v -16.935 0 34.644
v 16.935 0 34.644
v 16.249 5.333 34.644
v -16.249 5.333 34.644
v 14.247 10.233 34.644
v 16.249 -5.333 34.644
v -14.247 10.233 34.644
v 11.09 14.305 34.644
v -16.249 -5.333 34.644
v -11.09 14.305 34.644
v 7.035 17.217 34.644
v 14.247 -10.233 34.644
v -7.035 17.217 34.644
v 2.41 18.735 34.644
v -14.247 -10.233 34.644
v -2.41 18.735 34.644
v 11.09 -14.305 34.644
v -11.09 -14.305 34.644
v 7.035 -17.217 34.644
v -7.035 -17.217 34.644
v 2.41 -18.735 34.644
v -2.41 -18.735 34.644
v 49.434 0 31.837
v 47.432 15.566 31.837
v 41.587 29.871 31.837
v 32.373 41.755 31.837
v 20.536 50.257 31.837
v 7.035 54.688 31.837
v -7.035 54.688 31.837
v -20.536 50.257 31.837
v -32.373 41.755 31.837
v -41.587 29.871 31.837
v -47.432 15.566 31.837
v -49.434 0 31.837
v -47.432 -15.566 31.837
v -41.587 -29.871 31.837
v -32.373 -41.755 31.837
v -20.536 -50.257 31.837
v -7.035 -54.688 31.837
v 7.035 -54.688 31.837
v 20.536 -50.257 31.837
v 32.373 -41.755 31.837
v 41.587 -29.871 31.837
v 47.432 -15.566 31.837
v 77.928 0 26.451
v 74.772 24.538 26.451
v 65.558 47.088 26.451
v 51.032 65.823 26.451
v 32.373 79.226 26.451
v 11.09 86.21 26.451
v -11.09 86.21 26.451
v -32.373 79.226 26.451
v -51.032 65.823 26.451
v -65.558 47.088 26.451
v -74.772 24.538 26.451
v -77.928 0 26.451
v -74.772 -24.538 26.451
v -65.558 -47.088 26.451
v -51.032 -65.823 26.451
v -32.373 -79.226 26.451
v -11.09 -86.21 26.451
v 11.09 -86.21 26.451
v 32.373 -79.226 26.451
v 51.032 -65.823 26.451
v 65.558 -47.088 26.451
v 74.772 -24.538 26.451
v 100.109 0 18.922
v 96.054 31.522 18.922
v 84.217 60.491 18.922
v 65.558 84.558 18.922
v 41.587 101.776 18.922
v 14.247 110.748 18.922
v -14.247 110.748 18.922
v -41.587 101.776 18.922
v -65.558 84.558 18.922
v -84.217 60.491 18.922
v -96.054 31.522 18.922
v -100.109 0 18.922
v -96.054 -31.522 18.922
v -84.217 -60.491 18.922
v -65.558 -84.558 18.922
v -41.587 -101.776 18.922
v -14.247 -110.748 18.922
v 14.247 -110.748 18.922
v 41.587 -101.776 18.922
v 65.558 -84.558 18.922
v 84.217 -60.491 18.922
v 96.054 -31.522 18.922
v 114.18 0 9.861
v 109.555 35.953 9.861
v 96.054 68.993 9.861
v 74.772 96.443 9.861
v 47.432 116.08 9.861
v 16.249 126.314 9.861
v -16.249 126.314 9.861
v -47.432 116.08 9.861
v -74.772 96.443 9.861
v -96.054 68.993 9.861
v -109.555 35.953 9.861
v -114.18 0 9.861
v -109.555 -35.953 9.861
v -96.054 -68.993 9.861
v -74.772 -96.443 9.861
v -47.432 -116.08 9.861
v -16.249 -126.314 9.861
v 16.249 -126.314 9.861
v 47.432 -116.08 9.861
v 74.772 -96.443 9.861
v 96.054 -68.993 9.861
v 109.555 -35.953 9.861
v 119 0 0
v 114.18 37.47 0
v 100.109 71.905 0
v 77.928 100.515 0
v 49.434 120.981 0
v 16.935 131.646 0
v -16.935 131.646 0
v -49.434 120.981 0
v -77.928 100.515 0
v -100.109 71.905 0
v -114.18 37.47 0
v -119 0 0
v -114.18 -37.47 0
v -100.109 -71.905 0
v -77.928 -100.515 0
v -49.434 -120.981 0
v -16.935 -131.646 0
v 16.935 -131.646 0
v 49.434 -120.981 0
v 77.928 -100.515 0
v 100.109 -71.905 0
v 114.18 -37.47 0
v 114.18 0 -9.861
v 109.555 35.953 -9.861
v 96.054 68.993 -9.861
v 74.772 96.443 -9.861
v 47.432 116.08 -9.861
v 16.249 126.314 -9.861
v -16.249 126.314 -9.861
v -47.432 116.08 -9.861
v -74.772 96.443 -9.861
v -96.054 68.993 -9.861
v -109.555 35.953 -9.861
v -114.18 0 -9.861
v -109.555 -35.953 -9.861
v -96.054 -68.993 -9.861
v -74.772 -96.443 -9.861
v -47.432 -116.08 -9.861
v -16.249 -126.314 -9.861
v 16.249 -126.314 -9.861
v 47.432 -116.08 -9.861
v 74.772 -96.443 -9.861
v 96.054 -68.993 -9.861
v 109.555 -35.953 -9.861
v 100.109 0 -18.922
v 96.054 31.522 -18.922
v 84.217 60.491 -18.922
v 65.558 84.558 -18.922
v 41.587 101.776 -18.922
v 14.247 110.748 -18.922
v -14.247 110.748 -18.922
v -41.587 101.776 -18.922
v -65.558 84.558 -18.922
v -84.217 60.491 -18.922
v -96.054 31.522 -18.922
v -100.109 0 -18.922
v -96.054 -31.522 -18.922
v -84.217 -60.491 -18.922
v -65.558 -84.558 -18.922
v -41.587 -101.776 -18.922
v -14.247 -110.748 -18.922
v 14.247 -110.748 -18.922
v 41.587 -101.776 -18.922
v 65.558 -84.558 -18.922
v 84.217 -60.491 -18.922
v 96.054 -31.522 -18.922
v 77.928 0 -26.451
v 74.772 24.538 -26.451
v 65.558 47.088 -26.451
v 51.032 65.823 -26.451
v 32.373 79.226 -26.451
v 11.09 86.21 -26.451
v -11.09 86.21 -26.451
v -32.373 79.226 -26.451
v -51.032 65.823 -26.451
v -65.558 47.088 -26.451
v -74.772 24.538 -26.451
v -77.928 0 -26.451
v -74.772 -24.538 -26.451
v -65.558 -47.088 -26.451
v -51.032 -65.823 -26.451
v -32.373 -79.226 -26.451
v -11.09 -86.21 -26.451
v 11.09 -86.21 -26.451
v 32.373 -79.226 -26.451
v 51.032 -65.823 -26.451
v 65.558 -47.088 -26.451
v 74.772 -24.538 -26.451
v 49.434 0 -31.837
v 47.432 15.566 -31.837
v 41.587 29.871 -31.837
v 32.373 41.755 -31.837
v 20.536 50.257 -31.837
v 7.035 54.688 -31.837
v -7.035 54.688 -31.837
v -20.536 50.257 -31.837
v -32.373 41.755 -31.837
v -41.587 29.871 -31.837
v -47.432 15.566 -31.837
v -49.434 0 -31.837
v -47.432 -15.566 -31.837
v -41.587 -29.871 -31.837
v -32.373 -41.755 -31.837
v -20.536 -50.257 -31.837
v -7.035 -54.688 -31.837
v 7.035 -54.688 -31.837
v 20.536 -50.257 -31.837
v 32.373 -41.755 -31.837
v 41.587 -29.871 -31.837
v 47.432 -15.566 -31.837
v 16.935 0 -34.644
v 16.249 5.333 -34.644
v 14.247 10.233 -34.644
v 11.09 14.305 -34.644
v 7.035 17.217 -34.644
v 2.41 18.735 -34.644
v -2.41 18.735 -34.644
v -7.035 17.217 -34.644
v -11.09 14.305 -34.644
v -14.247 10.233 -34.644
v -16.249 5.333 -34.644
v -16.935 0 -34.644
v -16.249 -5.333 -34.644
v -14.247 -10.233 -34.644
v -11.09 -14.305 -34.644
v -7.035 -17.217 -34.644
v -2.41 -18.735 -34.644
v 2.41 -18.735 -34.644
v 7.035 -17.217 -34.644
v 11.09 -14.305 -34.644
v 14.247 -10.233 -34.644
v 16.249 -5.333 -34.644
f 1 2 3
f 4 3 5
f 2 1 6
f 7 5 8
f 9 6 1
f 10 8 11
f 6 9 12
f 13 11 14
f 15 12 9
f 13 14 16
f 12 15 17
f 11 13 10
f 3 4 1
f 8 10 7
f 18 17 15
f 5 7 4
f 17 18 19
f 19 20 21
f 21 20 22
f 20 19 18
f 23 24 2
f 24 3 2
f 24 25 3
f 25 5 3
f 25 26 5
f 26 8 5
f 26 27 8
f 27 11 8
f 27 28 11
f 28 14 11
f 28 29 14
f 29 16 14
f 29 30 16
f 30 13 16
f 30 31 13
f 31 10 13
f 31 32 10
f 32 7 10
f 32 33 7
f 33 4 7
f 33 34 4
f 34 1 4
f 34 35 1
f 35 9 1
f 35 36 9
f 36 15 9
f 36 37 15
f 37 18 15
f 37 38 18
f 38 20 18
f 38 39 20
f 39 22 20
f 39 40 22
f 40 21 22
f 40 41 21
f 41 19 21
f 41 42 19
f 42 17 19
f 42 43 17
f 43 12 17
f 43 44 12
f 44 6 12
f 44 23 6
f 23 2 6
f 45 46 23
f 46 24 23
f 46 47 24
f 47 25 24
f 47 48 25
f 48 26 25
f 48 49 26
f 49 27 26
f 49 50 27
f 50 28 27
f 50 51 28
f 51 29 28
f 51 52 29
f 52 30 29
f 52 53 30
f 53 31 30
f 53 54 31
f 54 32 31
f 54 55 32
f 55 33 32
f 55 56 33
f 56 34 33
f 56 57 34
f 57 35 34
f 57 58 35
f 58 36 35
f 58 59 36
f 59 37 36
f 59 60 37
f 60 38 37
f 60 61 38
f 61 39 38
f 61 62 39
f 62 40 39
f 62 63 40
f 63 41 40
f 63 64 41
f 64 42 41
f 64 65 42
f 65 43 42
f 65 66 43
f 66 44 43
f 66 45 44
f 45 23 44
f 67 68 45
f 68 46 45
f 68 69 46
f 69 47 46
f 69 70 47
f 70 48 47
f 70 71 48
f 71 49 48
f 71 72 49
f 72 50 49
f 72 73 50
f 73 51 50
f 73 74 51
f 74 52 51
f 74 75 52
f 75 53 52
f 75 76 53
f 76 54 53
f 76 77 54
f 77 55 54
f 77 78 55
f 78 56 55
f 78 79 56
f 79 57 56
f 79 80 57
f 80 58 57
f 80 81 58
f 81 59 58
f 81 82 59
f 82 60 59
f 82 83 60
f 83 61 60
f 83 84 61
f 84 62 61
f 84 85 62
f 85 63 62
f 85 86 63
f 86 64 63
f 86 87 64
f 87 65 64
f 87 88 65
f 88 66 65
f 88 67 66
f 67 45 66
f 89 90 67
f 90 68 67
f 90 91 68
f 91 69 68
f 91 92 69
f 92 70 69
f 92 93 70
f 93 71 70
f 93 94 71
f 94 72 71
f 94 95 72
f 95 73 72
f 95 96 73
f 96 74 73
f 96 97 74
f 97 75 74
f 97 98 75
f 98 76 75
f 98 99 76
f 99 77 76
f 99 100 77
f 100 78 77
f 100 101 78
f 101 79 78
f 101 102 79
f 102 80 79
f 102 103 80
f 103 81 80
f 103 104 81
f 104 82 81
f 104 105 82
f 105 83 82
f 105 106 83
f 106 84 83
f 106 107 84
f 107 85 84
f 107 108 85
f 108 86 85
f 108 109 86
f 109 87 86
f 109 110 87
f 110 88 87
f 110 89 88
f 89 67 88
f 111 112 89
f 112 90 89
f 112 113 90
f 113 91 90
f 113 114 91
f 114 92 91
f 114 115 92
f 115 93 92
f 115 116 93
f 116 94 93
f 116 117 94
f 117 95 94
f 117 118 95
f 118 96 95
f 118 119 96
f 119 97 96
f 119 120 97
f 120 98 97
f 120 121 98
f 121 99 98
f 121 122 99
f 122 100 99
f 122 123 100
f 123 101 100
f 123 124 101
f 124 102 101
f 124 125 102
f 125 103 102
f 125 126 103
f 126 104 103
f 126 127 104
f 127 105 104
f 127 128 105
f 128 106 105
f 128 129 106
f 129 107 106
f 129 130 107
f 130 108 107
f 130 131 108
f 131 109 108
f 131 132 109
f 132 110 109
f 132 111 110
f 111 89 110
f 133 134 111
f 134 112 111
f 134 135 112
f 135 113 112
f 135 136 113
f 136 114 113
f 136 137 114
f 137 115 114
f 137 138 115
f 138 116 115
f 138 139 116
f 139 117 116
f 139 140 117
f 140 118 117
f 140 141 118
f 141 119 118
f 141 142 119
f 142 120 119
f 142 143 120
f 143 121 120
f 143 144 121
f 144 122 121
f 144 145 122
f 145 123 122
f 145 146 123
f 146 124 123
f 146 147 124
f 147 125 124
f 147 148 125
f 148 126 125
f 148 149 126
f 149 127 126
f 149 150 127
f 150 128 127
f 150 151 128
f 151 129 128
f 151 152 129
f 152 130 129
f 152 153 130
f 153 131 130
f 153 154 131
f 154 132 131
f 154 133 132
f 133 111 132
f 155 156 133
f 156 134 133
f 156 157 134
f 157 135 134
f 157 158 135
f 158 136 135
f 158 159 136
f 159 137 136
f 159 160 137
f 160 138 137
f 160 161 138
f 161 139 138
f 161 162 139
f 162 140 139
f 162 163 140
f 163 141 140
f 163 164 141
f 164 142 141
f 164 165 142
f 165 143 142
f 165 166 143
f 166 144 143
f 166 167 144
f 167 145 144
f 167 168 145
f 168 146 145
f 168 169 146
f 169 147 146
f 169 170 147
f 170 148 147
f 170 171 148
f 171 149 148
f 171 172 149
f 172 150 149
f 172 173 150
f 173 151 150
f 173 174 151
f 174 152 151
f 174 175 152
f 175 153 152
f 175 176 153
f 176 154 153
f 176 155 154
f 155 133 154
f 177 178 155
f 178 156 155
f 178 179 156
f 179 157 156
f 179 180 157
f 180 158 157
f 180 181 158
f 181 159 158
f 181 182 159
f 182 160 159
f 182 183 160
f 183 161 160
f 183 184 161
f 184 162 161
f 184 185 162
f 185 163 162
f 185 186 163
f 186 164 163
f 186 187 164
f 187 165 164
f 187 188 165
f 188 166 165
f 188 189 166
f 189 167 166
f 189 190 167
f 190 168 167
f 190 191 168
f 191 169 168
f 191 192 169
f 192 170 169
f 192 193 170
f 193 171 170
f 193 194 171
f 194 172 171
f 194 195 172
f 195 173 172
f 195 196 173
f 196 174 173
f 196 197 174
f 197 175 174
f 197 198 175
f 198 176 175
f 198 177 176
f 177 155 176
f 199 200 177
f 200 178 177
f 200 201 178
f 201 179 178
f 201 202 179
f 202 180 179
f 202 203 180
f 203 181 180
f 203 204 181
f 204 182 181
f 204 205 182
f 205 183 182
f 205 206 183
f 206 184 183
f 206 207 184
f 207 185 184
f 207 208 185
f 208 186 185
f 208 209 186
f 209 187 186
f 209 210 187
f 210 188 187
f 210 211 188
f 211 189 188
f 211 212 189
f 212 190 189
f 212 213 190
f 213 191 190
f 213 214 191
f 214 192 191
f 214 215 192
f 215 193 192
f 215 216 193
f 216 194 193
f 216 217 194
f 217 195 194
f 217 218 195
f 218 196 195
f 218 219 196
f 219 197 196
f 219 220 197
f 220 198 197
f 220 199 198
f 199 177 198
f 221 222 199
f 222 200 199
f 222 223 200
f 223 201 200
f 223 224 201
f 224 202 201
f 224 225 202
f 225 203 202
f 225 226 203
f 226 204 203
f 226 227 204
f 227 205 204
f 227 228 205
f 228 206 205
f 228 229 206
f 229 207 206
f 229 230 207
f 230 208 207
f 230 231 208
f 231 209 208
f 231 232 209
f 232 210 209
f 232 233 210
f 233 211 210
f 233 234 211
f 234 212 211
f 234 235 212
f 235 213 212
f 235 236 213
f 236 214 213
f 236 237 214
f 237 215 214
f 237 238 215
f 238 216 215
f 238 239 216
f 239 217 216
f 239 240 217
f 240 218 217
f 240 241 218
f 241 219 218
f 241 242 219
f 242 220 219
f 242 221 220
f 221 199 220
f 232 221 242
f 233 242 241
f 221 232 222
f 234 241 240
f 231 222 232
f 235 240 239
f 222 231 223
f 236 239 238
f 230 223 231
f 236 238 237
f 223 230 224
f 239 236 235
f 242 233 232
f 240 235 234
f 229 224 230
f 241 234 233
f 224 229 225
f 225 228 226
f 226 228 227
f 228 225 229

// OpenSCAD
// Generated by SolidPython 1.0.1 on 2020-07-29 00:46:53


scale(v = [17, 19, 5]) {
	sphere(r = 7);
}
/***********************************************
*********      SolidPython code:      **********
************************************************
 
# import packages: SolidPython
from solid import *
from solid.utils import *
from itertools import chain, combinations, permutations


class Resize:

    def __init__(self, scad_file):
        self.scad_file = scad_file
        #self.scad_file = import_scad(scad_file)
        # cone/cylinder param:
        self.r1 = 0
        self.r2 = 0
        self.h = 0
        # rectangular prism param:
        self.w = 0
        self.l = 0
        # ellipse param:
        self.r = 0

    # import OpenScad code (file name corresponds to shape)


    # classify shape + parameters
    def assign(self, param1, param2, param3):
        if self.scad_file == 'cone.scad':
            self.r1 = param1
            self.r2 = param2
            self.h = param3
        elif self.scad_file == 'cylinder.scad':
            self.r1 = param1
            self.r2 = param2
            self.h = param3
        elif self.scad_file == 'rectangularPrism.scad':
            self.h = param1
            self.l = param2
            self.w = param3
        else:
            self.r = param1
            self.h = param2

    # resize parameters
    def iterate(self):
        x = range(3, 20, 2)
        i = 1
        if self.scad_file == 'cone.scad':
            tempList = list(permutations(x, 2))
            for temp in tempList:
                param1 = temp[0]
                param2 = temp[1]
                filepath = 'produced_scad_files/' + 'cone' + str(param1) + '_' + str(param2) + '_' + '.scad'
                scad_render_to_file(cylinder(h=param1, r1=param2, r2=0), filepath)

        elif self.scad_file == 'cylinder.scad':
            tempList = list(permutations(x, 3))
            for temp in tempList:
                param1 = temp[0]
                param2 = temp[1]
                filepath = 'produced_scad_files/' + 'cylinder' + str(param1) + '_' + str(param2) + '_' + '.scad'
                scad_render_to_file(cylinder(h=param1, r1=param2, r2=param2), filepath)

        elif self.scad_file == 'rectangularPrism.scad':
            tempList = list(permutations(x, 3))
            for temp in tempList:
                param1 = temp[0]
                param2 = temp[1]
                param3 = temp[2]
                filepath = 'produced_scad_files/' + 'rectangularPrism' + str(param1) + '_' + str(param2) + '_' + str(
                    param3) + '.scad'
                scad_render_to_file(cube(size=(param1, param2, param3)), filepath)

        elif self.scad_file == 'ellipse.scad':
            tempList = list(permutations(x, 4))
            for temp in tempList:
                param1 = temp[0]
                param2 = temp[1]
                param3 = temp[2]
                param4 = temp[3]
                filepath = 'produced_scad_files/' + 'ellipse' + str(param1) + '_' + str(param2) + '_' + str(param3) + '_' + str(param4) + '.scad'
                scad_render_to_file(scale([param1, param2, param3])(sphere(r=param4)), filepath)

    def render_to_scadfile(self):
        scad_render_to_file(scad, 'example.scad') 
 
************************************************/
